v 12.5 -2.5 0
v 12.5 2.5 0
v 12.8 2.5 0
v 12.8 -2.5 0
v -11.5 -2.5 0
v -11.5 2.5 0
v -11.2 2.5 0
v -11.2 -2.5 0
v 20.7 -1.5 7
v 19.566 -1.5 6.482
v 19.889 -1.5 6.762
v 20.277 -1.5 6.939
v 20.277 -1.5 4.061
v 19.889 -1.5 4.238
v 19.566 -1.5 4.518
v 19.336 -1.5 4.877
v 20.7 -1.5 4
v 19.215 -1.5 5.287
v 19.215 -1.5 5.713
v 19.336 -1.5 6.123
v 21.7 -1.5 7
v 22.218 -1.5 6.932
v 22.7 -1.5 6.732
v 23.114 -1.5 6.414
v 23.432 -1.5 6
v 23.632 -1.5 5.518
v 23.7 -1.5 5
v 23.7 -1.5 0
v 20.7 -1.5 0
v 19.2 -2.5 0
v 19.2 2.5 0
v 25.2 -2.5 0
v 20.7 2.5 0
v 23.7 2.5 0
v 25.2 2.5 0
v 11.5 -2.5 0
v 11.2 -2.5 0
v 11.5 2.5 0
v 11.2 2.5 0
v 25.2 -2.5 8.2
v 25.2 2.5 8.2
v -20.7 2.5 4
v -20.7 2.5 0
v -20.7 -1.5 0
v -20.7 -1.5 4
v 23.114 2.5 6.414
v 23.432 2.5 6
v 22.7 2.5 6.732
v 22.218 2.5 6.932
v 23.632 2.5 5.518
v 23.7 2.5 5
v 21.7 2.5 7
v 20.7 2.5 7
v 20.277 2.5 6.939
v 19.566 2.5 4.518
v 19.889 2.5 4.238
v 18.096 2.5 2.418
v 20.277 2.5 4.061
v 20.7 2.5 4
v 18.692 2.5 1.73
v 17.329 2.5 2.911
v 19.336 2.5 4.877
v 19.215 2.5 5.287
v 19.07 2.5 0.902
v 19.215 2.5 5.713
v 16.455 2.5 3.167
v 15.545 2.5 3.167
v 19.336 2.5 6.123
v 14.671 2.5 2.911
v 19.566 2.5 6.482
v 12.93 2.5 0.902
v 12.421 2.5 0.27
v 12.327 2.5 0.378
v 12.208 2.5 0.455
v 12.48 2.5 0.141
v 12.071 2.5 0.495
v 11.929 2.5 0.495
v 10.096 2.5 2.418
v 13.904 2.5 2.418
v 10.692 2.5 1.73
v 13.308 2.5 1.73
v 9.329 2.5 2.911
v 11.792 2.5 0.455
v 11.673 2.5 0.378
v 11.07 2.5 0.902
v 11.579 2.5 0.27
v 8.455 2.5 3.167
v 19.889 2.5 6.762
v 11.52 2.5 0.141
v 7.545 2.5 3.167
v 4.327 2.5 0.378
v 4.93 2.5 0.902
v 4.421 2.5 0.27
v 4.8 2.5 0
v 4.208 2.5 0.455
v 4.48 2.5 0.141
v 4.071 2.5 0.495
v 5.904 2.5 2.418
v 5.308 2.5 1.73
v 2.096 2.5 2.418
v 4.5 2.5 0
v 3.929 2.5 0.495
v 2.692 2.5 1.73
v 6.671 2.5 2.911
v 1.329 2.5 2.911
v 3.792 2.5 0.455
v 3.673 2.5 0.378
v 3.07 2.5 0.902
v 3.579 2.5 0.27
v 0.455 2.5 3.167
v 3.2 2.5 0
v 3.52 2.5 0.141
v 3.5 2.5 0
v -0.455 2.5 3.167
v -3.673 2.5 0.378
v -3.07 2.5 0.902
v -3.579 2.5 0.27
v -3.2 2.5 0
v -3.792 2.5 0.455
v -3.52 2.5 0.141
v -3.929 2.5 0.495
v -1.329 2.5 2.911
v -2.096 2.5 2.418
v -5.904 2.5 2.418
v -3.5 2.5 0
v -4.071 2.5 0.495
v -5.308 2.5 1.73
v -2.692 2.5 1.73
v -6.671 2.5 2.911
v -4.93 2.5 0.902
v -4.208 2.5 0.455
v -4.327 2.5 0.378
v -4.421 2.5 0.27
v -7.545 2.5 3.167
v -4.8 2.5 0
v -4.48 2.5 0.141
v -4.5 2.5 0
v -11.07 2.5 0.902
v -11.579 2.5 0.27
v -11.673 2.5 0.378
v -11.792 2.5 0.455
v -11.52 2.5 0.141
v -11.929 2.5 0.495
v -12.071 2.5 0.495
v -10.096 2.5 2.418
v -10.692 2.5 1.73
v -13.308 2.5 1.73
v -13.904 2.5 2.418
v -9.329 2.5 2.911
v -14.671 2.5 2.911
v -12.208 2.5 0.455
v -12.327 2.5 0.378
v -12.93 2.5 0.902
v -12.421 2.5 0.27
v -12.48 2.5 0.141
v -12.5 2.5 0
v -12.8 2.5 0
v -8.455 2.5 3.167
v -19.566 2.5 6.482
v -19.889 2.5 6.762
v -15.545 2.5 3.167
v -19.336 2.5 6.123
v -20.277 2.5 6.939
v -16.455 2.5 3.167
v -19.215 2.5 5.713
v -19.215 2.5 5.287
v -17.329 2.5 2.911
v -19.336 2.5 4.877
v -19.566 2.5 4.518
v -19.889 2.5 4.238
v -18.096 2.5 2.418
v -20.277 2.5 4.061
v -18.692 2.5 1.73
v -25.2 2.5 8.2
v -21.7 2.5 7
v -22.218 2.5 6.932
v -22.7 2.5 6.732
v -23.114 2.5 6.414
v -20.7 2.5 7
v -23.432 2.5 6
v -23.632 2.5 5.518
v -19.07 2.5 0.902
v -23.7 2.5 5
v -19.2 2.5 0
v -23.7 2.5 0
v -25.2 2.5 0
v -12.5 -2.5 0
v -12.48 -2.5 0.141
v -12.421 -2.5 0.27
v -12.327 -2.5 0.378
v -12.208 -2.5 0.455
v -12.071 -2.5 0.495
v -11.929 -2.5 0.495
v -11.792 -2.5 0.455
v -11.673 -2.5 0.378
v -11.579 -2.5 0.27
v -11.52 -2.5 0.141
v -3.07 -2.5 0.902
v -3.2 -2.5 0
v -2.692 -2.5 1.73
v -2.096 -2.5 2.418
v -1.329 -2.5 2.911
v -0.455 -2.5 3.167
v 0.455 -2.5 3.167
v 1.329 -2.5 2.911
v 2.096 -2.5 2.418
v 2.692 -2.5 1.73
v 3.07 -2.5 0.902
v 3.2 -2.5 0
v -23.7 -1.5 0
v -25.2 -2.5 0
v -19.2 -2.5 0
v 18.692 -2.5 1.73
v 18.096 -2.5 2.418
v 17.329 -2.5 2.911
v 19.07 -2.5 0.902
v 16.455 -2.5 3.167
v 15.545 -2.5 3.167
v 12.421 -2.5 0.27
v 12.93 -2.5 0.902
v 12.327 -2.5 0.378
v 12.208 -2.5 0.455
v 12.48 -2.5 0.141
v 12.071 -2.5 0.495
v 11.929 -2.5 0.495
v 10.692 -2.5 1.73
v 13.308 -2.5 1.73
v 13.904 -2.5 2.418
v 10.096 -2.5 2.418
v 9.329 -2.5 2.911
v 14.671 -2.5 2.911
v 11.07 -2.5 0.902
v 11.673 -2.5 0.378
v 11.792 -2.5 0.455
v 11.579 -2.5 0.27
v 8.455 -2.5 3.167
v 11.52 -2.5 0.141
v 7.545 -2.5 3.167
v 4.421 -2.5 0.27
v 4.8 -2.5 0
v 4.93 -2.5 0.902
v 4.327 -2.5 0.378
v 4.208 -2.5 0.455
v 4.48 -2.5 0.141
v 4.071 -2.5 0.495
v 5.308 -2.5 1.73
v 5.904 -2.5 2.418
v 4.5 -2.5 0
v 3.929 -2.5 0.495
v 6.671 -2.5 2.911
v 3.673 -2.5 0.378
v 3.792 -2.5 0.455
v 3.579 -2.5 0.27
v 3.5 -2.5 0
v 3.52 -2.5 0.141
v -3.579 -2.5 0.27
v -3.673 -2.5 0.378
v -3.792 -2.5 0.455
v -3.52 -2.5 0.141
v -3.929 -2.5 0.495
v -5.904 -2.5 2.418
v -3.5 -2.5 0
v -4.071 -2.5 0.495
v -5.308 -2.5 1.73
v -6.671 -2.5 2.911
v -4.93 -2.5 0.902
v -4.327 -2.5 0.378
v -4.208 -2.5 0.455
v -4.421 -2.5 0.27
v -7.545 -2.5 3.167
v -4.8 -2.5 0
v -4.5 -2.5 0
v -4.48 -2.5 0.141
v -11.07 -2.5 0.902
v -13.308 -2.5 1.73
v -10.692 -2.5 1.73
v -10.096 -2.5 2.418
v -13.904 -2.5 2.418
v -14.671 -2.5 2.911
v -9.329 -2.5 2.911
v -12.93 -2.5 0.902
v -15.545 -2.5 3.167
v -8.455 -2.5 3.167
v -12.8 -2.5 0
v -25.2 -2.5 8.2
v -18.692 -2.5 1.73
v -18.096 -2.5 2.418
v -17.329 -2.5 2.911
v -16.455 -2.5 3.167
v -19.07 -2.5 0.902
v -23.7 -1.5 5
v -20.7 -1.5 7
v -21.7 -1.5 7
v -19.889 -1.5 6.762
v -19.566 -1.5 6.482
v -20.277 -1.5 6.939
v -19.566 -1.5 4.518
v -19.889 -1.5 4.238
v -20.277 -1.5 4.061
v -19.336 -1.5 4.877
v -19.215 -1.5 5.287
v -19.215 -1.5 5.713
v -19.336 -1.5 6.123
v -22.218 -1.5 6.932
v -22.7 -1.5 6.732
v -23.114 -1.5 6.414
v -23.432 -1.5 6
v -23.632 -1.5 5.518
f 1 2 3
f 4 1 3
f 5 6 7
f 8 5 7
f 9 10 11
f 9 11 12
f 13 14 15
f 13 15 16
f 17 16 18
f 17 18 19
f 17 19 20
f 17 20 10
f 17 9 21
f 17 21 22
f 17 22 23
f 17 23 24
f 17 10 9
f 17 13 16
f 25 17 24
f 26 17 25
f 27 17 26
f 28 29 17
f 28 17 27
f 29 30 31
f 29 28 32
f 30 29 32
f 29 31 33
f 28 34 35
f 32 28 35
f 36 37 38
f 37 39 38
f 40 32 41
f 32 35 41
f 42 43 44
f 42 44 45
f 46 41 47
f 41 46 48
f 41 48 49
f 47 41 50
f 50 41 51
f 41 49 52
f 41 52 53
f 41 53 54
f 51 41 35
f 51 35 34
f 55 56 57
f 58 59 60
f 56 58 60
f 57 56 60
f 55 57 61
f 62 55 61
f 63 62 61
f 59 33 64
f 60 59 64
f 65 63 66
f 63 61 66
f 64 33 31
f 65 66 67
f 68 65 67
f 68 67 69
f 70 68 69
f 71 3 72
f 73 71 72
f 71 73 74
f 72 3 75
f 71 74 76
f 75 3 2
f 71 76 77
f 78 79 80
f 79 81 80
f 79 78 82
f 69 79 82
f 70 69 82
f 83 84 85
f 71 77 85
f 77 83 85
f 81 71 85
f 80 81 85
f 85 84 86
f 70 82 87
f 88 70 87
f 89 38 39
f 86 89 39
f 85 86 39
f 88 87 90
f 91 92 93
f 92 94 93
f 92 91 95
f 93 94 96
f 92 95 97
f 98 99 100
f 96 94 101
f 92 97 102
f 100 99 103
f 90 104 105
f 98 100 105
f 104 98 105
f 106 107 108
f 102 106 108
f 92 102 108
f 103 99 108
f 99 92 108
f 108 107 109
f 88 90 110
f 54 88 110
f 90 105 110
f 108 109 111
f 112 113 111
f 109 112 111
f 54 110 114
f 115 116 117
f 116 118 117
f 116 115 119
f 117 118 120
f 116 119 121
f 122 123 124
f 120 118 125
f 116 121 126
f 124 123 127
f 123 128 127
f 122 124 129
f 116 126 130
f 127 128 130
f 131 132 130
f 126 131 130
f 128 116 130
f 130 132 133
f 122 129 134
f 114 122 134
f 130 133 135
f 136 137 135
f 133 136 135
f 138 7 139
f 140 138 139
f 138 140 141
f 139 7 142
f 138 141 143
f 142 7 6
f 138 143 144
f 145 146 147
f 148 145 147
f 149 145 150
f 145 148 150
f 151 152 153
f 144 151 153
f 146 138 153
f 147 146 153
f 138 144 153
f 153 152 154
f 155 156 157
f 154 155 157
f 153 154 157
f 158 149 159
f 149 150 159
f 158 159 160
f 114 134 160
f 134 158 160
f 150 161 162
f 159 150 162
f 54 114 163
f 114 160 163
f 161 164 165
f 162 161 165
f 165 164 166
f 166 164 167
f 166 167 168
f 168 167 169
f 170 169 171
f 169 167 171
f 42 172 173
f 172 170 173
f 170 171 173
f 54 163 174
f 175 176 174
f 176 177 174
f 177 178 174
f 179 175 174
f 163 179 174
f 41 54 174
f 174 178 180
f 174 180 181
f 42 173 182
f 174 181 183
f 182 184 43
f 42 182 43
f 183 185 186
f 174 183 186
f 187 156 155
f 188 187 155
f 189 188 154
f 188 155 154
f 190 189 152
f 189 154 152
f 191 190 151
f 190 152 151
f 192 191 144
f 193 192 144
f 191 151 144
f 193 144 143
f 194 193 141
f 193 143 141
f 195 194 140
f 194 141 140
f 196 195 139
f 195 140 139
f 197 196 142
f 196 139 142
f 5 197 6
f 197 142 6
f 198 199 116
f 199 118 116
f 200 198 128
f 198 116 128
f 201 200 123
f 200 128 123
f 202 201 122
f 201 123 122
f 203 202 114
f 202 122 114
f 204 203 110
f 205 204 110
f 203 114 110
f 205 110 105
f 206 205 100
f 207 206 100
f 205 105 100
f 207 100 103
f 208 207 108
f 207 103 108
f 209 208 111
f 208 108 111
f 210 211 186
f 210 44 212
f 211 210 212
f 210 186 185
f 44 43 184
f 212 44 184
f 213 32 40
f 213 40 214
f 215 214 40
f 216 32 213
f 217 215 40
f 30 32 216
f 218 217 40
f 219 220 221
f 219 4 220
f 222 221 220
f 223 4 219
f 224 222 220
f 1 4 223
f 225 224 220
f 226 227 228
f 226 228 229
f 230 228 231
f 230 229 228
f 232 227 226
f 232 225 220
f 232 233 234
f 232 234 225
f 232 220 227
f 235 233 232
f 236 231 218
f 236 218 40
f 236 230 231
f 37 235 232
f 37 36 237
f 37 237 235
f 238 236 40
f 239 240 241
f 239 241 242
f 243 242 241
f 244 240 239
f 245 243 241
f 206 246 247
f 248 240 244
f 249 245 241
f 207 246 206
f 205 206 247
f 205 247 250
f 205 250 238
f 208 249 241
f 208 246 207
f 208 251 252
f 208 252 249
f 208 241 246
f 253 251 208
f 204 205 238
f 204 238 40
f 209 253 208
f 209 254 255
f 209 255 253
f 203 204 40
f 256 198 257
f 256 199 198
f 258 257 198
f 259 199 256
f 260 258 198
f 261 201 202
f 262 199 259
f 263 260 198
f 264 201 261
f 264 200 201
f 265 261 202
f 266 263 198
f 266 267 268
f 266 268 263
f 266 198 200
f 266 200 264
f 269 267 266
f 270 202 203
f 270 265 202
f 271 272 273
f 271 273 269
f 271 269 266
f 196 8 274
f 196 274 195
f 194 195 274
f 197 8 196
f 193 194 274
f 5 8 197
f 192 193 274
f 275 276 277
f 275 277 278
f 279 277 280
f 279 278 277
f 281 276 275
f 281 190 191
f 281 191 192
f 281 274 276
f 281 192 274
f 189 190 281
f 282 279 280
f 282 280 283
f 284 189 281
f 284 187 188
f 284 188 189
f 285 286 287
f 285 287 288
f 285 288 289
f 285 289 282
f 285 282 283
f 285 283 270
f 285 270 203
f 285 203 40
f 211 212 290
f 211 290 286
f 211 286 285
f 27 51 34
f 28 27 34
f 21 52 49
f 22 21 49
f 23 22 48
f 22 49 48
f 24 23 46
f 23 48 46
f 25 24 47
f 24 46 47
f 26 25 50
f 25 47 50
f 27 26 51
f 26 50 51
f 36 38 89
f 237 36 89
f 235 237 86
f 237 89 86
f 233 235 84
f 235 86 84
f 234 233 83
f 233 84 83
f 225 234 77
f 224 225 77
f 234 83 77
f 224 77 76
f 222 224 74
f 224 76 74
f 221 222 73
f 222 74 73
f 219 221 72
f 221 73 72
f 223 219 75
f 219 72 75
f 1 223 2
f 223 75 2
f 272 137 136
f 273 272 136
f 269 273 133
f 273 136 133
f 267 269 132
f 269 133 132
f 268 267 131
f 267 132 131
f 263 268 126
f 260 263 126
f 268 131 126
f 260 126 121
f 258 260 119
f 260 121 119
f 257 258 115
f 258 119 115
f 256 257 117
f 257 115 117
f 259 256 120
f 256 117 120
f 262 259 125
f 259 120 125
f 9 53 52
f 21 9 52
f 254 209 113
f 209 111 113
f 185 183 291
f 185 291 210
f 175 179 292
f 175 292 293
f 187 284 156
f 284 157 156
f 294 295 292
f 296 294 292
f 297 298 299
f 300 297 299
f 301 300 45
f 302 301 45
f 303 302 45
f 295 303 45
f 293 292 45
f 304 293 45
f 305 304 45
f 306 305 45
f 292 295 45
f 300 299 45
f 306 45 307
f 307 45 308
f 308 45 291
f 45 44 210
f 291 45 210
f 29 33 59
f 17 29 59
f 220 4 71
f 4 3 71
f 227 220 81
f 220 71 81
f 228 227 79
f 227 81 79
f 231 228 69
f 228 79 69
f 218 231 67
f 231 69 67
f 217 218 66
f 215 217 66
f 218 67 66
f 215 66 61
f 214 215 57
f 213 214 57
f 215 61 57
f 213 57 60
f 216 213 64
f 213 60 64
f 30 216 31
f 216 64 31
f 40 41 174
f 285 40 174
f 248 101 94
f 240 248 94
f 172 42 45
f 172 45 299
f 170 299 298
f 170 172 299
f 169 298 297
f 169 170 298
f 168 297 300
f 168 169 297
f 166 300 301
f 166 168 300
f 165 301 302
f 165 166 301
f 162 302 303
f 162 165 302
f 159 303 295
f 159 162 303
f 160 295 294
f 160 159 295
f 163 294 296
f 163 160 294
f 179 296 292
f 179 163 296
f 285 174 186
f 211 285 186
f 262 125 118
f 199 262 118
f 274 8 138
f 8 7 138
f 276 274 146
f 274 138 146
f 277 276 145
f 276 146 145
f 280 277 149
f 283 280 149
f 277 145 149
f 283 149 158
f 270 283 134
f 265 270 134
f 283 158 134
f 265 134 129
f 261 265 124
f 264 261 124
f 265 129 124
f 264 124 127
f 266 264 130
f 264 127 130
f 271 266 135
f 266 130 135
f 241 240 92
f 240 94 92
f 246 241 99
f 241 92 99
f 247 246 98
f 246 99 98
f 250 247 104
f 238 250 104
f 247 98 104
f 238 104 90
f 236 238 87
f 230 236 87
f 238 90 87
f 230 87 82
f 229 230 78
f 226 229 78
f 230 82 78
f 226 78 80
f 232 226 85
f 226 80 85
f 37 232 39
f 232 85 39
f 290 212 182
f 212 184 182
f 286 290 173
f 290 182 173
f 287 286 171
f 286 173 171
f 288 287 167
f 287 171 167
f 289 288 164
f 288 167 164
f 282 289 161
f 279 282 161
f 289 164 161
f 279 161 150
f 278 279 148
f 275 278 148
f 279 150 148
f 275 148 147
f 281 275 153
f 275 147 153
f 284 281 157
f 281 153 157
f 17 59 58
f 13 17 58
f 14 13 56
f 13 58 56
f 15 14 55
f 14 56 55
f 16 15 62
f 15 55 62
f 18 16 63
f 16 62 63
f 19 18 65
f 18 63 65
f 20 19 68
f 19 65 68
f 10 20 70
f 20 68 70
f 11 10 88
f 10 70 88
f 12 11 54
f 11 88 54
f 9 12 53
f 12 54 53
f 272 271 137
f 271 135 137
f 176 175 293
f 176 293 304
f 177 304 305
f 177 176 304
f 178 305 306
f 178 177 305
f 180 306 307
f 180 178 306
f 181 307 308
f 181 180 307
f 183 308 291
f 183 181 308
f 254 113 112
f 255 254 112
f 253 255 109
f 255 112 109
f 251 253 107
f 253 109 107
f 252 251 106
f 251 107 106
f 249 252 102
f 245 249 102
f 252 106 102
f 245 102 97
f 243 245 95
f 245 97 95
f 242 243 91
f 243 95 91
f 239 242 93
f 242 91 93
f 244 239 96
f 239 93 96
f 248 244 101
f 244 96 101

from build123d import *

# Parameters (mm, degrees)
RESSALTO_EXTRUS_O1_DEPTH = 2.5
ESBO_O2_R                = 0.5
CORTE_EXTRUS_O1_DEPTH    = 27.968129338
CORTE_EXTRUS_O2_DEPTH    = 4


with BuildPart() as part:
    # Esboço1 → Ressalto-extrusão1 (new, symmetric)
    with BuildSketch(Plane(origin=(0, 0, 0), x_dir=(1, 0, 0), z_dir=(0, 1, 0))):
        with BuildLine():
            Line((-25.2, 0), (-19.2, 0))
            ThreePointArc((-19.2, 0), (-16, -3.2), (-12.8, 0))
            Line((-12.8, 0), (-11.2, 0))
            ThreePointArc((-11.2, 0), (-8, -3.2), (-4.8, 0))
            Line((-4.8, 0), (-3.2, 0))
            ThreePointArc((-3.2, 0), (0, -3.2), (3.2, 0))
            Line((3.2, 0), (4.8, 0))
            ThreePointArc((4.8, 0), (8, -3.2), (11.2, 0))
            Line((11.2, 0), (12.8, 0))
            ThreePointArc((12.8, 0), (16, -3.2), (19.2, 0))
            Line((19.2, 0), (25.2, 0))
            Line((25.2, 0), (25.2, -8.2))
            Line((25.2, -8.2), (-25.2, -8.2))
            Line((-25.2, -8.2), (-25.2, 0))
        make_face()
    extrude(amount=RESSALTO_EXTRUS_O1_DEPTH, both=True)

    # Esboço2 → Corte-extrusão1 (cut, through all)
    with BuildSketch(Plane(origin=(0, 2.5, 0), x_dir=(1, 0, 0), z_dir=(0, 1, 0))):
        with Locations((-12, 0)):
            Circle(ESBO_O2_R)
        with Locations((-4, 0)):
            Circle(ESBO_O2_R)
        with Locations((4, 0)):
            Circle(ESBO_O2_R)
        with Locations((12, 0)):
            Circle(ESBO_O2_R)
    extrude(amount=-CORTE_EXTRUS_O1_DEPTH, mode=Mode.SUBTRACT)

    # Esboço3 → Corte-extrusão2 (cut)
    with BuildSketch(Plane(origin=(0, 2.5, 0), x_dir=(1, 0, 0), z_dir=(0, 1, 0))):
        with BuildLine():
            Line((-23.7, 0), (-20.7, 0))
            Line((-20.7, 0), (-20.7, -4))
            ThreePointArc((-20.7, -4), (-19.2, -5.5), (-20.7, -7))
            Line((-20.7, -7), (-21.7, -7))
            ThreePointArc((-21.7, -7), (-23.114213562, -6.414213562), (-23.7, -5))
            Line((-23.7, -5), (-23.7, 0))
        make_face()
        with BuildLine():
            Line((20.7, 0), (20.7, -4))
            ThreePointArc((20.7, -4), (19.2, -5.5), (20.7, -7))
            Line((20.7, -7), (21.7, -7))
            ThreePointArc((21.7, -7), (23.114213562, -6.414213562), (23.7, -5))
            Line((23.7, -5), (23.7, 0))
            Line((23.7, 0), (20.7, 0))
        make_face()
    extrude(amount=-CORTE_EXTRUS_O2_DEPTH, mode=Mode.SUBTRACT)


solid = part.part
